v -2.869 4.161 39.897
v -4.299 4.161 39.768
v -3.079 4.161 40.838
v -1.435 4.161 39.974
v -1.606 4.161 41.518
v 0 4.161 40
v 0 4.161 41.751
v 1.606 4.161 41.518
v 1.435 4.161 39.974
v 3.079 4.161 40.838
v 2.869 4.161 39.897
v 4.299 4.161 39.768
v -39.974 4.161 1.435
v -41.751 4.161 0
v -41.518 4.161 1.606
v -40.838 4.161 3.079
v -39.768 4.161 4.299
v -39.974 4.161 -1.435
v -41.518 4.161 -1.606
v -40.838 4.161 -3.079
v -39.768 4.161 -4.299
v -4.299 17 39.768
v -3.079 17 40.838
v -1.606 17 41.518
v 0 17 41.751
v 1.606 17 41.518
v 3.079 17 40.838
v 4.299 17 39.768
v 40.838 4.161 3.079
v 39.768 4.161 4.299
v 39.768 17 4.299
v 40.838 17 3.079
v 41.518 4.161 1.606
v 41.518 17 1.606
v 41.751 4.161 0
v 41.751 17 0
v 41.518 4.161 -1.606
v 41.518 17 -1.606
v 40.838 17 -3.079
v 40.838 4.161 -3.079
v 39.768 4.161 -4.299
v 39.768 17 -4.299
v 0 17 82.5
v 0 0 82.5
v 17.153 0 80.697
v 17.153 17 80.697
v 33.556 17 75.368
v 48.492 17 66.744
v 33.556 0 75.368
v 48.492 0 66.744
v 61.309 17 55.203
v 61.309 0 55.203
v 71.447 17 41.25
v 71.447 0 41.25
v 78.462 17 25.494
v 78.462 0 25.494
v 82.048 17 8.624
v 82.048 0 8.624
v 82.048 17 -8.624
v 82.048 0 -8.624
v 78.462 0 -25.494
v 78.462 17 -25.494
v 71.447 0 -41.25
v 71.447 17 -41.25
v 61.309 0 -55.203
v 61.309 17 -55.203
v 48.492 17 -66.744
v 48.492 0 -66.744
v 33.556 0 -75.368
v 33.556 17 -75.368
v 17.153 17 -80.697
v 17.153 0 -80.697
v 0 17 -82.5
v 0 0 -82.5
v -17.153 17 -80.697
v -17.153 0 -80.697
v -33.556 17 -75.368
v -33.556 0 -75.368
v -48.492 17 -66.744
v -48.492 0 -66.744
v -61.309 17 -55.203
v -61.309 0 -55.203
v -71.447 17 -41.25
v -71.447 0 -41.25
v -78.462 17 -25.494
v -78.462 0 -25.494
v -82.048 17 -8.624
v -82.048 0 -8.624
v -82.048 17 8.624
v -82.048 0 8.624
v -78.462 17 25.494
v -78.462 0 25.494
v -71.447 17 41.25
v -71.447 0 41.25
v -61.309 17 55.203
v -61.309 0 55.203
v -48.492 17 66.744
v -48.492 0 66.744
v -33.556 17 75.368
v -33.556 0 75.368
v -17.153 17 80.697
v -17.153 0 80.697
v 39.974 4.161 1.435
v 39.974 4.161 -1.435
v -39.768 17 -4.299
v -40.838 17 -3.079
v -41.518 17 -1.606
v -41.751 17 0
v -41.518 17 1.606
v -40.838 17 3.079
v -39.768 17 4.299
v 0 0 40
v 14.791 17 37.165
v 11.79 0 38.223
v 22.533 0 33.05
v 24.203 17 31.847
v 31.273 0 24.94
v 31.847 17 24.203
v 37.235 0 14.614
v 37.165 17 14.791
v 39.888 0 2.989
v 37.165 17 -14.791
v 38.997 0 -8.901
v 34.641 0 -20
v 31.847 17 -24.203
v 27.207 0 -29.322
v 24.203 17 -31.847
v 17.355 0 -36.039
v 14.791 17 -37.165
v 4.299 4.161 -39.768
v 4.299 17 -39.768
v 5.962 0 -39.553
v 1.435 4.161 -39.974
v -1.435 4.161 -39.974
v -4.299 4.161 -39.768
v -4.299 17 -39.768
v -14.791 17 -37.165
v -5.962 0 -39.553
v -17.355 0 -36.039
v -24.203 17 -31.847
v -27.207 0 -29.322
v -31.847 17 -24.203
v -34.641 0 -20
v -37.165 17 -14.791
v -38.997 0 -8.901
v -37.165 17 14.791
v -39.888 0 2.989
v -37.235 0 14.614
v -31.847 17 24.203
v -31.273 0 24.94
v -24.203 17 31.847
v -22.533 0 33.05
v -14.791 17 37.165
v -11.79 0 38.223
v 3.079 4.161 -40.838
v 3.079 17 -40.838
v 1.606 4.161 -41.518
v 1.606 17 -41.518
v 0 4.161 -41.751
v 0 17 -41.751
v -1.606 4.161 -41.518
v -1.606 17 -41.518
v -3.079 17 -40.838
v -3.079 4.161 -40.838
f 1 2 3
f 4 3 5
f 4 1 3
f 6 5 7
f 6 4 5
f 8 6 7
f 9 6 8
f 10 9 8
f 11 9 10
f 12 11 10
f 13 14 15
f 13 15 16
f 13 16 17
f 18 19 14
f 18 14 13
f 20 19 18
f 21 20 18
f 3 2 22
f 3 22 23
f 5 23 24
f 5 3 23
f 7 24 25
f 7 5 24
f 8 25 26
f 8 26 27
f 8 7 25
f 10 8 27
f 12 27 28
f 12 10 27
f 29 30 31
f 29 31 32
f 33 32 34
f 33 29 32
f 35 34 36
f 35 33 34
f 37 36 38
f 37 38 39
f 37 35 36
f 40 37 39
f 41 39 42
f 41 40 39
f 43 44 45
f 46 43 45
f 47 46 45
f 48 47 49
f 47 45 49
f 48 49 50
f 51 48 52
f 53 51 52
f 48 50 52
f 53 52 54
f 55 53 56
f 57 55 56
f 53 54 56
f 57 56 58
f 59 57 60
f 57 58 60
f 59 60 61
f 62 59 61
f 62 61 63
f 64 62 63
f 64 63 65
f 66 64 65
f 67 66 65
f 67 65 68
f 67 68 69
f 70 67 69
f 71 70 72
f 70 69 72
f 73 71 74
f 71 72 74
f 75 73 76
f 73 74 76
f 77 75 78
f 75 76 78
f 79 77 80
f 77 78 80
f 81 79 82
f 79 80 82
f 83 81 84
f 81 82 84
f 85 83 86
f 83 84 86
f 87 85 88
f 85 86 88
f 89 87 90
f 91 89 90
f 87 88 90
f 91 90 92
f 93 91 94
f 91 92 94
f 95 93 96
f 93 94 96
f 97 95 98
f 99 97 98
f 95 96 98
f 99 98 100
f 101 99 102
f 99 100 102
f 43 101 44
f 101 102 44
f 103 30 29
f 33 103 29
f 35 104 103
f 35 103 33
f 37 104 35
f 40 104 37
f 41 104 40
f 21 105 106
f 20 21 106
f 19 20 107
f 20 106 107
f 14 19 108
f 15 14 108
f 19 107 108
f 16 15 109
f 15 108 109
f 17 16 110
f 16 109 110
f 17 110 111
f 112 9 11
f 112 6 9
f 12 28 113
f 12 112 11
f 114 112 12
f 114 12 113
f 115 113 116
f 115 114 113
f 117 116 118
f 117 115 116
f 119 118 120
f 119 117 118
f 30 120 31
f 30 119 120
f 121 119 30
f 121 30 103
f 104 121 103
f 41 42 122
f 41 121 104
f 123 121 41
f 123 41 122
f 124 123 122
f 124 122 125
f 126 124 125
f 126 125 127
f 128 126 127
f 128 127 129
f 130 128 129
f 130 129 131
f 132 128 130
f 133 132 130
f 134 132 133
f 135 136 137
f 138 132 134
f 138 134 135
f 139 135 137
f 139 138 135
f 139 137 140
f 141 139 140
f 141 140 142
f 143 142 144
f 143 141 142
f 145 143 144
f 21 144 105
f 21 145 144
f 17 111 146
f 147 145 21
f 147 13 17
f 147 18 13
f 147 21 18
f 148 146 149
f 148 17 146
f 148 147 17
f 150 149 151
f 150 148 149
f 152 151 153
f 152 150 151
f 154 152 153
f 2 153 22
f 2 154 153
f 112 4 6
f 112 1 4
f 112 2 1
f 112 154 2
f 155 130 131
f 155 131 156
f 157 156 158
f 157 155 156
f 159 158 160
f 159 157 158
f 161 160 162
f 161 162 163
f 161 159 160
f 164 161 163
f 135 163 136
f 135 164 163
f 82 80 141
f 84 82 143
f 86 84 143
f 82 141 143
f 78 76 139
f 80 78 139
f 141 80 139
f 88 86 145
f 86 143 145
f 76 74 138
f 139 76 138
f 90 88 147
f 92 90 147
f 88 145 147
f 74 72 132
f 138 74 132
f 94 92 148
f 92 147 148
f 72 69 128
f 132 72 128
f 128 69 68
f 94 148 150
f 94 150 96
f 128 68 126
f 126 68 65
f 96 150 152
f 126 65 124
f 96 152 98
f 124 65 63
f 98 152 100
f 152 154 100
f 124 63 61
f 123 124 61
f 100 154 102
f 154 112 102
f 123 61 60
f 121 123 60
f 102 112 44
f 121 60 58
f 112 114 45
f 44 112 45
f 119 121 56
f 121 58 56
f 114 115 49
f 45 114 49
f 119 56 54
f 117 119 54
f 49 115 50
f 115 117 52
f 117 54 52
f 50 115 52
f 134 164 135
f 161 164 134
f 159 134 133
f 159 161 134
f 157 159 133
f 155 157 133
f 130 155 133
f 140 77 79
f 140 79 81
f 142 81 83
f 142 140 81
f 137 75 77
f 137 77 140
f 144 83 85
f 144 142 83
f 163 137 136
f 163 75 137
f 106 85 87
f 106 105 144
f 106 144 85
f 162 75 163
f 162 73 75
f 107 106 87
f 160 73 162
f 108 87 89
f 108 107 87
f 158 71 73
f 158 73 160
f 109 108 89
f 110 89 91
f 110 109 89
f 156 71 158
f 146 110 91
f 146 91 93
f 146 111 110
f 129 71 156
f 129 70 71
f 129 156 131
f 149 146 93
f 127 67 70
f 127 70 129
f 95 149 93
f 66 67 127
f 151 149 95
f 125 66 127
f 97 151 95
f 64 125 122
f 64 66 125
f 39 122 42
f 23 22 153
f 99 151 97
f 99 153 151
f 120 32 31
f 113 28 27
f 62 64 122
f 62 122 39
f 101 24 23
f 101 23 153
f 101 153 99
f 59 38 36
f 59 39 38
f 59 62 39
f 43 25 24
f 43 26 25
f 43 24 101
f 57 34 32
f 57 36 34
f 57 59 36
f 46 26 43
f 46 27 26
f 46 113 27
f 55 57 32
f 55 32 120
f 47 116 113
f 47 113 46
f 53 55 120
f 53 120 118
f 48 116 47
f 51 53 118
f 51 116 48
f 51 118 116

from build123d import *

# Parameters (mm, degrees)
SKETCH1_R           = 82.5
BOSS_EXTRUDE1_DEPTH = 17
SKETCH2_R           = 40
CUT_EXTRUDE1_DEPTH  = 118.904622471
SKETCH3_R           = 5.652492576
CUT_EXTRUDE2_DEPTH  = 12.839244405
CIRPATTERN1_COUNT   = 4


with BuildPart() as part:
    # Sketch1 → Boss-Extrude1 (new body)
    with BuildSketch(Plane(origin=(0, 0, 0), x_dir=(1, 0, 0), z_dir=(0, 1, 0))):
        Circle(SKETCH1_R)
    extrude(amount=BOSS_EXTRUDE1_DEPTH)

    # Sketch2 → Cut-Extrude1 (cut, through all)
    with BuildSketch(Plane(origin=(0, 0, 0), x_dir=(1, 0, 0), z_dir=(0, 1, 0))):
        Circle(SKETCH2_R)
    extrude(amount=CUT_EXTRUDE1_DEPTH, mode=Mode.SUBTRACT)

    # Sketch3 → Cut-Extrude2 (cut)
    with BuildSketch(Plane(origin=(0, 17, 0), x_dir=(1, 0, 0), z_dir=(0, 1, 0))):
        with Locations((-36.098285333, 0)):
            Circle(SKETCH3_R)
    cut_extrude2 = extrude(amount=-CUT_EXTRUDE2_DEPTH, mode=Mode.SUBTRACT)

    # CirPattern1: Cut-Extrude2 ×4 about axis
    cirpattern1_axis = Axis((0, 0, 0), (0, 1, 0))
    for i in range(1, CIRPATTERN1_COUNT):
        add(cut_extrude2.rotate(cirpattern1_axis, i * 360 / CIRPATTERN1_COUNT), mode=Mode.SUBTRACT)


solid = part.part
